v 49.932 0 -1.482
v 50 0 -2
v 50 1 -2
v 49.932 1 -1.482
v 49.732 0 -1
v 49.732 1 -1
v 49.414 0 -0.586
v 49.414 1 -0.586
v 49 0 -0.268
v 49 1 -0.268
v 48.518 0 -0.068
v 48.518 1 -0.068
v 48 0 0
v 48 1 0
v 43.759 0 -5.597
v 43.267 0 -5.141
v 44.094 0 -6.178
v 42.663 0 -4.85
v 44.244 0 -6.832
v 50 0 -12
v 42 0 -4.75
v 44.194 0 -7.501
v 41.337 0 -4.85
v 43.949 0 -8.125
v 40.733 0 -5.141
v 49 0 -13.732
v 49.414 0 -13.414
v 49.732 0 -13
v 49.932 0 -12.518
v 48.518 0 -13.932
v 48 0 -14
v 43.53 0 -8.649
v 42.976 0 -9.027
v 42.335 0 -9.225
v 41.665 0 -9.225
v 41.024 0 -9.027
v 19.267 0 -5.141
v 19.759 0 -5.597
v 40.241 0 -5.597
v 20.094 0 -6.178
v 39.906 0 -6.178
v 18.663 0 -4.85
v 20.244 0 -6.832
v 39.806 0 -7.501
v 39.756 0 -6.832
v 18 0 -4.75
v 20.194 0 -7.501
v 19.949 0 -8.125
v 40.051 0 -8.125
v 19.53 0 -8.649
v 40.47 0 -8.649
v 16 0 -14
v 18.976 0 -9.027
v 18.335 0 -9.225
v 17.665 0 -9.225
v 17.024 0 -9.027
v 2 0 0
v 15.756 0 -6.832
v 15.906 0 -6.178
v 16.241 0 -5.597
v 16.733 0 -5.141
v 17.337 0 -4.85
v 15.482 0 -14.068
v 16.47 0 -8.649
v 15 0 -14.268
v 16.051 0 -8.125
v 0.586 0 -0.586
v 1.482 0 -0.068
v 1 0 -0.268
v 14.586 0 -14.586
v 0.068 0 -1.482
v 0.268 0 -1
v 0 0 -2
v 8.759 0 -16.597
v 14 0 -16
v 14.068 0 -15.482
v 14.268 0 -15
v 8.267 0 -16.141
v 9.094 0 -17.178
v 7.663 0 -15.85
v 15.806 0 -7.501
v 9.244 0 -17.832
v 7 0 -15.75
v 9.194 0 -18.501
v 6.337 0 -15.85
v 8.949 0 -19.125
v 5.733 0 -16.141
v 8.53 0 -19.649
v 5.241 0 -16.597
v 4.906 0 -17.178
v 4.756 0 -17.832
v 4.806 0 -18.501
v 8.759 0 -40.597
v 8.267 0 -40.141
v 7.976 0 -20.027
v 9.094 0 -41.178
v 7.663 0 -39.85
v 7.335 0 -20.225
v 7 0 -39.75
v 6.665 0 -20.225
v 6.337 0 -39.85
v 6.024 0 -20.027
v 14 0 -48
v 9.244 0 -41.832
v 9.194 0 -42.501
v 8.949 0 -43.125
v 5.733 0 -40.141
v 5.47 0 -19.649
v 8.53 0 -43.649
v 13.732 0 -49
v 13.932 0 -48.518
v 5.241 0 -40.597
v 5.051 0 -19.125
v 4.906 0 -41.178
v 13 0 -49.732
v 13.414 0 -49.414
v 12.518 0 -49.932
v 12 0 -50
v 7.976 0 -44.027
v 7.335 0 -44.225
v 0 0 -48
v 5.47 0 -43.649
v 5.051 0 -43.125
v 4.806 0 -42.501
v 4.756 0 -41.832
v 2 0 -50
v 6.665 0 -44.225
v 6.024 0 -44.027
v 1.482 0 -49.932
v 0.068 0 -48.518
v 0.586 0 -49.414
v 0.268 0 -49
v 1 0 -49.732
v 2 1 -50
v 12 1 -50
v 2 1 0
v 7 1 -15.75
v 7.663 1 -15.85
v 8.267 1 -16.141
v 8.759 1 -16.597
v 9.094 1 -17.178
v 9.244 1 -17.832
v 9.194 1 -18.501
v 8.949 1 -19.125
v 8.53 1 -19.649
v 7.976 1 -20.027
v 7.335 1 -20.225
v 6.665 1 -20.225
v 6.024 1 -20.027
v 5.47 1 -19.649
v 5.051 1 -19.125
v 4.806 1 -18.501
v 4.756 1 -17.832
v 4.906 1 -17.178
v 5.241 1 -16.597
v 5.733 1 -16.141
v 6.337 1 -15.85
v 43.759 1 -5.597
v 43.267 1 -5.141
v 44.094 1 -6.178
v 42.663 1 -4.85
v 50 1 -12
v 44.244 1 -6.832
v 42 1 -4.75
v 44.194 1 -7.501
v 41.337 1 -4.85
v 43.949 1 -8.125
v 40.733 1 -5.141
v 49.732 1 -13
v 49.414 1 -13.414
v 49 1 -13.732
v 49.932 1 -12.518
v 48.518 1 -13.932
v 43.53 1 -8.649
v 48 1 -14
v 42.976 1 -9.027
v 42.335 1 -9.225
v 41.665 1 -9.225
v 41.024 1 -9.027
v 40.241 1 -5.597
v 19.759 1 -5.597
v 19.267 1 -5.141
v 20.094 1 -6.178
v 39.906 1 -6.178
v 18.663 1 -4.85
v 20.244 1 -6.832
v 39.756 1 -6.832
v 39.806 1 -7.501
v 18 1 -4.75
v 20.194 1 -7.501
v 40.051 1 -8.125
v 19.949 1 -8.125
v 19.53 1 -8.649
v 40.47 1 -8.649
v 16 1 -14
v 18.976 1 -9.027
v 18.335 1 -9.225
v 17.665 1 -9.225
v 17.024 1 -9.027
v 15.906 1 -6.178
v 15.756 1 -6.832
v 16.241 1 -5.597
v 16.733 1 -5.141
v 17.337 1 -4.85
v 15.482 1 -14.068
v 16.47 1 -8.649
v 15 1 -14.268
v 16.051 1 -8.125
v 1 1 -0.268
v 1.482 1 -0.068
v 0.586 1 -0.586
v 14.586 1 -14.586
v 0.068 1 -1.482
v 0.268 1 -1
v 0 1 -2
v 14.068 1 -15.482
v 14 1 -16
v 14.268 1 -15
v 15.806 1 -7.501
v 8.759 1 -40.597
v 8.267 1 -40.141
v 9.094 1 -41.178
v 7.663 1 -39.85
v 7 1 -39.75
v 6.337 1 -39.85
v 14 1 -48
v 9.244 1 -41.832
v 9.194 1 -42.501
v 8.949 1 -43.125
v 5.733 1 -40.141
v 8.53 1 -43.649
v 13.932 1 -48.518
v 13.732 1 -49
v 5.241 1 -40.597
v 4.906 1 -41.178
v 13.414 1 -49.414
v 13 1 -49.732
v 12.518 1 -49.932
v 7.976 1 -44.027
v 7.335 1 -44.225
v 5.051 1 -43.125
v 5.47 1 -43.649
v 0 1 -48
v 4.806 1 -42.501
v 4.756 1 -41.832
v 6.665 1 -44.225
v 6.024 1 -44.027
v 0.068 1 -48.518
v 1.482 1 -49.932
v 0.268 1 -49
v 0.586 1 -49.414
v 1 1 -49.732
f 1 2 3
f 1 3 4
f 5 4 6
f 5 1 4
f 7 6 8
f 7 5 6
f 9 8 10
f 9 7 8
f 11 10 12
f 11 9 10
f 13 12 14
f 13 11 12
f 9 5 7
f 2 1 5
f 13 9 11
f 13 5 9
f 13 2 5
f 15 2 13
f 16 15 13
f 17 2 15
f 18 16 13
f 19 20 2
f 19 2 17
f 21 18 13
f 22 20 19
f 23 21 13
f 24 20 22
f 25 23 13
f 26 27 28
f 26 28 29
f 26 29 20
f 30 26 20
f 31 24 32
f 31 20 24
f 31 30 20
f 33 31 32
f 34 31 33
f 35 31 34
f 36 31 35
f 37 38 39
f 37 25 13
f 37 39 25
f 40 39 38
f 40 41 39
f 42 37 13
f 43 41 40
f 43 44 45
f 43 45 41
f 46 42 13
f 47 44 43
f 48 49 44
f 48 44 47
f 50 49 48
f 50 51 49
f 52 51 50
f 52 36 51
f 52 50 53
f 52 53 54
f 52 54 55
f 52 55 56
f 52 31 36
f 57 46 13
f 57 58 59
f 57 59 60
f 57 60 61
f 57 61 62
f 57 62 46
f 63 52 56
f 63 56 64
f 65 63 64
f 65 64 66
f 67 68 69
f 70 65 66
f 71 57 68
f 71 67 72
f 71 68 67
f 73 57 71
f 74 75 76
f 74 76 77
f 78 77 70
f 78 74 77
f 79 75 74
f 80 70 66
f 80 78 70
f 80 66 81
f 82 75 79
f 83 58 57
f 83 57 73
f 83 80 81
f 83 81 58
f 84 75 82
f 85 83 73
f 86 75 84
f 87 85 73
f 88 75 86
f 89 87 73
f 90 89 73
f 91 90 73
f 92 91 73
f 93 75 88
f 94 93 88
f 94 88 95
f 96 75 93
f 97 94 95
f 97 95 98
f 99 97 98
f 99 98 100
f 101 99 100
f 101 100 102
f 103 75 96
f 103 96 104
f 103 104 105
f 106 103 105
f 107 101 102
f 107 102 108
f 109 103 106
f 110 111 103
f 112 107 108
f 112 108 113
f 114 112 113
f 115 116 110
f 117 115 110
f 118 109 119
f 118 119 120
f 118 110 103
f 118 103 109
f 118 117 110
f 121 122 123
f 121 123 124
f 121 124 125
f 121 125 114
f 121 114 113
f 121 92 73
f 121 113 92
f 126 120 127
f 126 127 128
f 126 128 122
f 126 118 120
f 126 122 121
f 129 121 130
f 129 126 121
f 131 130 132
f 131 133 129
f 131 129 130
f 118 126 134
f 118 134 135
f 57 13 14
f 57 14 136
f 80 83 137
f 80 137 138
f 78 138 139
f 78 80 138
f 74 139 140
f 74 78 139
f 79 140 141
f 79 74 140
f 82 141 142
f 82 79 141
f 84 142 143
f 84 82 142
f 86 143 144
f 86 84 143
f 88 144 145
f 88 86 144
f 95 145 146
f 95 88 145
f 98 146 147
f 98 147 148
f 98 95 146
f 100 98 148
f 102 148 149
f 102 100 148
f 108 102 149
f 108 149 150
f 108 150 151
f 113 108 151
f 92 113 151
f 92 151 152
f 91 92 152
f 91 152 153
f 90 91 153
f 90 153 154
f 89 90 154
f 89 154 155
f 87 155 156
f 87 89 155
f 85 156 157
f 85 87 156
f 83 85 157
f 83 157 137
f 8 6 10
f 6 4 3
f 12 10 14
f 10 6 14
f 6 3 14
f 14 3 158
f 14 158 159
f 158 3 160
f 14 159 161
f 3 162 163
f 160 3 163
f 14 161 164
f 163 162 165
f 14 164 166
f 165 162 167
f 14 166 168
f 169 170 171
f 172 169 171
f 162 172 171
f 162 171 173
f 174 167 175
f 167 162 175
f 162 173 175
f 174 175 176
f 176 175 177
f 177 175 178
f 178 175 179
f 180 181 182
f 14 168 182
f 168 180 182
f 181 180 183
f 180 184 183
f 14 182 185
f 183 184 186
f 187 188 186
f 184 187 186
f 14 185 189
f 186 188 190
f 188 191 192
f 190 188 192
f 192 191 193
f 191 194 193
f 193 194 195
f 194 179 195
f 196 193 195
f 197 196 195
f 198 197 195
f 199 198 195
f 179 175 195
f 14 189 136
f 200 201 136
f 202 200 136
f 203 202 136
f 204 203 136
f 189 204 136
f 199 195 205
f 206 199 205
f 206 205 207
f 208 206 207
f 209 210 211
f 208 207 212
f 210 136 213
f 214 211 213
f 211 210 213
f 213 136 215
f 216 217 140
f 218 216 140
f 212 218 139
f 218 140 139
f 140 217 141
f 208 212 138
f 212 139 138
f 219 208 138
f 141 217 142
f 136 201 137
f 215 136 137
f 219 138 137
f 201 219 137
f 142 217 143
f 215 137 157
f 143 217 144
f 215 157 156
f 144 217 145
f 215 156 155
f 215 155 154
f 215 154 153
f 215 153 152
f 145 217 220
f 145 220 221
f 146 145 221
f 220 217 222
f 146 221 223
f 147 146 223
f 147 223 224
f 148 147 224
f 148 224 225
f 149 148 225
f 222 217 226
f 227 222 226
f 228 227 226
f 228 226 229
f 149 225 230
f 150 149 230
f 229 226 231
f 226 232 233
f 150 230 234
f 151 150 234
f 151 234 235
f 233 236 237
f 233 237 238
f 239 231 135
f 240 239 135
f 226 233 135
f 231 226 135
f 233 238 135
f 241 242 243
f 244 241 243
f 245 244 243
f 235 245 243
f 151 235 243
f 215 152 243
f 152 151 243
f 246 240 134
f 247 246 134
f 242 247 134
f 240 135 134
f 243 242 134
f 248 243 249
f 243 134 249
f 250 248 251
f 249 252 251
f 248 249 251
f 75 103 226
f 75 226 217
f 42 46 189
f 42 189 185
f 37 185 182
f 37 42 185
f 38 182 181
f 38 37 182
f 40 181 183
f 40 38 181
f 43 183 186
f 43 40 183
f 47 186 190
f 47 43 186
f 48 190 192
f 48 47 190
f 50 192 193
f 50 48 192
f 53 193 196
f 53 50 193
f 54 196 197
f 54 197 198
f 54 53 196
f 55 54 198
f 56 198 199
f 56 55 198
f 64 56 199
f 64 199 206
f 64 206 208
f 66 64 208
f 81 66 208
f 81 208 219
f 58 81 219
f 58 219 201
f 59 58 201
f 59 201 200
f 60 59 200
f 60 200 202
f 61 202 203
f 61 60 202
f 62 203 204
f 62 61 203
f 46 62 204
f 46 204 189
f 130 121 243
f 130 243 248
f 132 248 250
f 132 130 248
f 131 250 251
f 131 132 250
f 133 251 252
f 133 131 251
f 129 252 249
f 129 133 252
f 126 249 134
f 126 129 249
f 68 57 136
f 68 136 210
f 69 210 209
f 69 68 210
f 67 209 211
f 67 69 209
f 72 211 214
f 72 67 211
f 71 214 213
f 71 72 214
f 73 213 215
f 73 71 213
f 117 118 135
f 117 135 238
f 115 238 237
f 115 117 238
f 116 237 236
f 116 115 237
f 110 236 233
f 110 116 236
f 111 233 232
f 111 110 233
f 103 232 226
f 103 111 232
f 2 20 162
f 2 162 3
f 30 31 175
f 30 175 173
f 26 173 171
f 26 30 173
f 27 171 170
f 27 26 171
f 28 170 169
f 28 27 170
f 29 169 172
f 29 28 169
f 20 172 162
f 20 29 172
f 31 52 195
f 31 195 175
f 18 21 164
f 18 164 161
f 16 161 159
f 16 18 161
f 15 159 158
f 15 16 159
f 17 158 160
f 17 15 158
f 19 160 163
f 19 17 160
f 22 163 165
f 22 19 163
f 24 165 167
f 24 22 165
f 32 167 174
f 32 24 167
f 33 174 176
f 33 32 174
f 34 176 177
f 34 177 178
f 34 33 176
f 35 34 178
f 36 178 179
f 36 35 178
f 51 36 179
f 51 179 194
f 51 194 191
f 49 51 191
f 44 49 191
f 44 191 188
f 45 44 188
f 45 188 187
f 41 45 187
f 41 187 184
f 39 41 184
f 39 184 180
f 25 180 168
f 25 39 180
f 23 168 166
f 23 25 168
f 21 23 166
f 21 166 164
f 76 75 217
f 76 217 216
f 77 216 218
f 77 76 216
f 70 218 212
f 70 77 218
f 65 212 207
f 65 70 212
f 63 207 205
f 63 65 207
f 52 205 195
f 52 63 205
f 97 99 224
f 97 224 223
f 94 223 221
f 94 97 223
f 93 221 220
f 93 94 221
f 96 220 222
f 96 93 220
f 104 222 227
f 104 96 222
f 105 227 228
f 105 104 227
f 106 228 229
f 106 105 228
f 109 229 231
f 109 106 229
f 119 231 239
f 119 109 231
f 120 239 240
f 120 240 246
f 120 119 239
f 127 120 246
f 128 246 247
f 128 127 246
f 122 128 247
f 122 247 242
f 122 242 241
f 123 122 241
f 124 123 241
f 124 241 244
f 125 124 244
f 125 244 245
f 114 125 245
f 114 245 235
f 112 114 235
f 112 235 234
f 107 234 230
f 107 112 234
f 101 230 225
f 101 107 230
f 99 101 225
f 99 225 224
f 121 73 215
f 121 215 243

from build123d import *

# Parameters (mm, degrees)
SKETCH_1_R      = 2.25
EXTRUDE_2_DEPTH = 1


with BuildPart() as part:
    # 草图1 → 凸台-拉伸2 (new body)
    with BuildSketch(Plane(origin=(0, 0, 0), x_dir=(1, 0, 0), z_dir=(0, 1, 0))):
        with BuildLine():
            Line((2, 50), (12, 50))
            ThreePointArc((12, 50), (13.414213562, 49.414213562), (14, 48))
            Line((14, 48), (14, 16))
            ThreePointArc((14, 16), (14.585786438, 14.585786438), (16, 14))
            Line((16, 14), (48, 14))
            ThreePointArc((48, 14), (49.414213562, 13.414213562), (50, 12))
            Line((50, 12), (50, 2))
            ThreePointArc((50, 2), (49.414213562, 0.585786438), (48, 0))
            Line((48, 0), (2, 0))
            ThreePointArc((2, 0), (0.585786438, 0.585786438), (0, 2))
            Line((0, 2), (0, 48))
            ThreePointArc((0, 48), (0.585786438, 49.414213562), (2, 50))
        make_face()
        with Locations(Location((18, 7, 0), (0, 0, 270))):
            Circle(SKETCH_1_R, mode=Mode.SUBTRACT)
        with Locations(Location((42, 7, 0), (0, 0, 270))):
            Circle(SKETCH_1_R, mode=Mode.SUBTRACT)
        with Locations(Location((7, 18, 0), (0, 0, 270))):
            Circle(SKETCH_1_R, mode=Mode.SUBTRACT)
        with Locations(Location((7, 42, 0), (0, 0, 270))):
            Circle(SKETCH_1_R, mode=Mode.SUBTRACT)
    extrude(amount=EXTRUDE_2_DEPTH)


solid = part.part
